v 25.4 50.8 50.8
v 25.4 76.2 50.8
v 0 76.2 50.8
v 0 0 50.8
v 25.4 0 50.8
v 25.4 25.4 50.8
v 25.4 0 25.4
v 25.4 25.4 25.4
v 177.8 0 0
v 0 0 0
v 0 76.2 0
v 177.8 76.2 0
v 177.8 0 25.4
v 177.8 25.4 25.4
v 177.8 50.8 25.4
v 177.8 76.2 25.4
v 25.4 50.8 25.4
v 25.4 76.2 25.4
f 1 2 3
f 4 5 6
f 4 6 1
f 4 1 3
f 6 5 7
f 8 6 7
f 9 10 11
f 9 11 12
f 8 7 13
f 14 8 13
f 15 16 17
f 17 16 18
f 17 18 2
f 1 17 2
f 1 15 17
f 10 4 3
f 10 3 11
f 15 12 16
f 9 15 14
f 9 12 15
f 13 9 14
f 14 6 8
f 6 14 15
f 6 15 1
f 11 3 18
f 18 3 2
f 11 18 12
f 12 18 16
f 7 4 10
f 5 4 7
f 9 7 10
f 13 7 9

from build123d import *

# Parameters (mm, degrees)
F1_DEPTH = 76.2
F3_DEPTH = 25.4
F5_DEPTH = 25.4


with BuildPart() as f1:
    # F0 (on Front) → F1 (new body)
    with BuildSketch(Plane.XZ):
        Polygon((0, 50.8), (0, 0), (177.8, 0), (177.8, 25.4), (25.4, 25.4), (25.4, 50.8), align=None)
        Polygon((177.8, 25.4), (25.4, 50.8), (25.4, 25.4), align=None)
    extrude(amount=-F1_DEPTH)

    # F2 (on face) → F3 (cut)
    with BuildSketch(Plane.XZ):
        Polygon((177.8, 25.4), (25.4, 50.8), (25.4, 25.4), align=None)
    extrude(amount=-F3_DEPTH, mode=Mode.SUBTRACT)

    # F4 (on face) → F5 (cut)
    with BuildSketch(Plane(origin=(0, 76.2, 0), x_dir=(-1, 0, 0), z_dir=(0, 1, 0))):
        Polygon((-25.4, 25.4), (-25.4, 50.8), (-177.8, 25.4), align=None)
    extrude(amount=-F5_DEPTH, mode=Mode.SUBTRACT)


solid = f1.part
